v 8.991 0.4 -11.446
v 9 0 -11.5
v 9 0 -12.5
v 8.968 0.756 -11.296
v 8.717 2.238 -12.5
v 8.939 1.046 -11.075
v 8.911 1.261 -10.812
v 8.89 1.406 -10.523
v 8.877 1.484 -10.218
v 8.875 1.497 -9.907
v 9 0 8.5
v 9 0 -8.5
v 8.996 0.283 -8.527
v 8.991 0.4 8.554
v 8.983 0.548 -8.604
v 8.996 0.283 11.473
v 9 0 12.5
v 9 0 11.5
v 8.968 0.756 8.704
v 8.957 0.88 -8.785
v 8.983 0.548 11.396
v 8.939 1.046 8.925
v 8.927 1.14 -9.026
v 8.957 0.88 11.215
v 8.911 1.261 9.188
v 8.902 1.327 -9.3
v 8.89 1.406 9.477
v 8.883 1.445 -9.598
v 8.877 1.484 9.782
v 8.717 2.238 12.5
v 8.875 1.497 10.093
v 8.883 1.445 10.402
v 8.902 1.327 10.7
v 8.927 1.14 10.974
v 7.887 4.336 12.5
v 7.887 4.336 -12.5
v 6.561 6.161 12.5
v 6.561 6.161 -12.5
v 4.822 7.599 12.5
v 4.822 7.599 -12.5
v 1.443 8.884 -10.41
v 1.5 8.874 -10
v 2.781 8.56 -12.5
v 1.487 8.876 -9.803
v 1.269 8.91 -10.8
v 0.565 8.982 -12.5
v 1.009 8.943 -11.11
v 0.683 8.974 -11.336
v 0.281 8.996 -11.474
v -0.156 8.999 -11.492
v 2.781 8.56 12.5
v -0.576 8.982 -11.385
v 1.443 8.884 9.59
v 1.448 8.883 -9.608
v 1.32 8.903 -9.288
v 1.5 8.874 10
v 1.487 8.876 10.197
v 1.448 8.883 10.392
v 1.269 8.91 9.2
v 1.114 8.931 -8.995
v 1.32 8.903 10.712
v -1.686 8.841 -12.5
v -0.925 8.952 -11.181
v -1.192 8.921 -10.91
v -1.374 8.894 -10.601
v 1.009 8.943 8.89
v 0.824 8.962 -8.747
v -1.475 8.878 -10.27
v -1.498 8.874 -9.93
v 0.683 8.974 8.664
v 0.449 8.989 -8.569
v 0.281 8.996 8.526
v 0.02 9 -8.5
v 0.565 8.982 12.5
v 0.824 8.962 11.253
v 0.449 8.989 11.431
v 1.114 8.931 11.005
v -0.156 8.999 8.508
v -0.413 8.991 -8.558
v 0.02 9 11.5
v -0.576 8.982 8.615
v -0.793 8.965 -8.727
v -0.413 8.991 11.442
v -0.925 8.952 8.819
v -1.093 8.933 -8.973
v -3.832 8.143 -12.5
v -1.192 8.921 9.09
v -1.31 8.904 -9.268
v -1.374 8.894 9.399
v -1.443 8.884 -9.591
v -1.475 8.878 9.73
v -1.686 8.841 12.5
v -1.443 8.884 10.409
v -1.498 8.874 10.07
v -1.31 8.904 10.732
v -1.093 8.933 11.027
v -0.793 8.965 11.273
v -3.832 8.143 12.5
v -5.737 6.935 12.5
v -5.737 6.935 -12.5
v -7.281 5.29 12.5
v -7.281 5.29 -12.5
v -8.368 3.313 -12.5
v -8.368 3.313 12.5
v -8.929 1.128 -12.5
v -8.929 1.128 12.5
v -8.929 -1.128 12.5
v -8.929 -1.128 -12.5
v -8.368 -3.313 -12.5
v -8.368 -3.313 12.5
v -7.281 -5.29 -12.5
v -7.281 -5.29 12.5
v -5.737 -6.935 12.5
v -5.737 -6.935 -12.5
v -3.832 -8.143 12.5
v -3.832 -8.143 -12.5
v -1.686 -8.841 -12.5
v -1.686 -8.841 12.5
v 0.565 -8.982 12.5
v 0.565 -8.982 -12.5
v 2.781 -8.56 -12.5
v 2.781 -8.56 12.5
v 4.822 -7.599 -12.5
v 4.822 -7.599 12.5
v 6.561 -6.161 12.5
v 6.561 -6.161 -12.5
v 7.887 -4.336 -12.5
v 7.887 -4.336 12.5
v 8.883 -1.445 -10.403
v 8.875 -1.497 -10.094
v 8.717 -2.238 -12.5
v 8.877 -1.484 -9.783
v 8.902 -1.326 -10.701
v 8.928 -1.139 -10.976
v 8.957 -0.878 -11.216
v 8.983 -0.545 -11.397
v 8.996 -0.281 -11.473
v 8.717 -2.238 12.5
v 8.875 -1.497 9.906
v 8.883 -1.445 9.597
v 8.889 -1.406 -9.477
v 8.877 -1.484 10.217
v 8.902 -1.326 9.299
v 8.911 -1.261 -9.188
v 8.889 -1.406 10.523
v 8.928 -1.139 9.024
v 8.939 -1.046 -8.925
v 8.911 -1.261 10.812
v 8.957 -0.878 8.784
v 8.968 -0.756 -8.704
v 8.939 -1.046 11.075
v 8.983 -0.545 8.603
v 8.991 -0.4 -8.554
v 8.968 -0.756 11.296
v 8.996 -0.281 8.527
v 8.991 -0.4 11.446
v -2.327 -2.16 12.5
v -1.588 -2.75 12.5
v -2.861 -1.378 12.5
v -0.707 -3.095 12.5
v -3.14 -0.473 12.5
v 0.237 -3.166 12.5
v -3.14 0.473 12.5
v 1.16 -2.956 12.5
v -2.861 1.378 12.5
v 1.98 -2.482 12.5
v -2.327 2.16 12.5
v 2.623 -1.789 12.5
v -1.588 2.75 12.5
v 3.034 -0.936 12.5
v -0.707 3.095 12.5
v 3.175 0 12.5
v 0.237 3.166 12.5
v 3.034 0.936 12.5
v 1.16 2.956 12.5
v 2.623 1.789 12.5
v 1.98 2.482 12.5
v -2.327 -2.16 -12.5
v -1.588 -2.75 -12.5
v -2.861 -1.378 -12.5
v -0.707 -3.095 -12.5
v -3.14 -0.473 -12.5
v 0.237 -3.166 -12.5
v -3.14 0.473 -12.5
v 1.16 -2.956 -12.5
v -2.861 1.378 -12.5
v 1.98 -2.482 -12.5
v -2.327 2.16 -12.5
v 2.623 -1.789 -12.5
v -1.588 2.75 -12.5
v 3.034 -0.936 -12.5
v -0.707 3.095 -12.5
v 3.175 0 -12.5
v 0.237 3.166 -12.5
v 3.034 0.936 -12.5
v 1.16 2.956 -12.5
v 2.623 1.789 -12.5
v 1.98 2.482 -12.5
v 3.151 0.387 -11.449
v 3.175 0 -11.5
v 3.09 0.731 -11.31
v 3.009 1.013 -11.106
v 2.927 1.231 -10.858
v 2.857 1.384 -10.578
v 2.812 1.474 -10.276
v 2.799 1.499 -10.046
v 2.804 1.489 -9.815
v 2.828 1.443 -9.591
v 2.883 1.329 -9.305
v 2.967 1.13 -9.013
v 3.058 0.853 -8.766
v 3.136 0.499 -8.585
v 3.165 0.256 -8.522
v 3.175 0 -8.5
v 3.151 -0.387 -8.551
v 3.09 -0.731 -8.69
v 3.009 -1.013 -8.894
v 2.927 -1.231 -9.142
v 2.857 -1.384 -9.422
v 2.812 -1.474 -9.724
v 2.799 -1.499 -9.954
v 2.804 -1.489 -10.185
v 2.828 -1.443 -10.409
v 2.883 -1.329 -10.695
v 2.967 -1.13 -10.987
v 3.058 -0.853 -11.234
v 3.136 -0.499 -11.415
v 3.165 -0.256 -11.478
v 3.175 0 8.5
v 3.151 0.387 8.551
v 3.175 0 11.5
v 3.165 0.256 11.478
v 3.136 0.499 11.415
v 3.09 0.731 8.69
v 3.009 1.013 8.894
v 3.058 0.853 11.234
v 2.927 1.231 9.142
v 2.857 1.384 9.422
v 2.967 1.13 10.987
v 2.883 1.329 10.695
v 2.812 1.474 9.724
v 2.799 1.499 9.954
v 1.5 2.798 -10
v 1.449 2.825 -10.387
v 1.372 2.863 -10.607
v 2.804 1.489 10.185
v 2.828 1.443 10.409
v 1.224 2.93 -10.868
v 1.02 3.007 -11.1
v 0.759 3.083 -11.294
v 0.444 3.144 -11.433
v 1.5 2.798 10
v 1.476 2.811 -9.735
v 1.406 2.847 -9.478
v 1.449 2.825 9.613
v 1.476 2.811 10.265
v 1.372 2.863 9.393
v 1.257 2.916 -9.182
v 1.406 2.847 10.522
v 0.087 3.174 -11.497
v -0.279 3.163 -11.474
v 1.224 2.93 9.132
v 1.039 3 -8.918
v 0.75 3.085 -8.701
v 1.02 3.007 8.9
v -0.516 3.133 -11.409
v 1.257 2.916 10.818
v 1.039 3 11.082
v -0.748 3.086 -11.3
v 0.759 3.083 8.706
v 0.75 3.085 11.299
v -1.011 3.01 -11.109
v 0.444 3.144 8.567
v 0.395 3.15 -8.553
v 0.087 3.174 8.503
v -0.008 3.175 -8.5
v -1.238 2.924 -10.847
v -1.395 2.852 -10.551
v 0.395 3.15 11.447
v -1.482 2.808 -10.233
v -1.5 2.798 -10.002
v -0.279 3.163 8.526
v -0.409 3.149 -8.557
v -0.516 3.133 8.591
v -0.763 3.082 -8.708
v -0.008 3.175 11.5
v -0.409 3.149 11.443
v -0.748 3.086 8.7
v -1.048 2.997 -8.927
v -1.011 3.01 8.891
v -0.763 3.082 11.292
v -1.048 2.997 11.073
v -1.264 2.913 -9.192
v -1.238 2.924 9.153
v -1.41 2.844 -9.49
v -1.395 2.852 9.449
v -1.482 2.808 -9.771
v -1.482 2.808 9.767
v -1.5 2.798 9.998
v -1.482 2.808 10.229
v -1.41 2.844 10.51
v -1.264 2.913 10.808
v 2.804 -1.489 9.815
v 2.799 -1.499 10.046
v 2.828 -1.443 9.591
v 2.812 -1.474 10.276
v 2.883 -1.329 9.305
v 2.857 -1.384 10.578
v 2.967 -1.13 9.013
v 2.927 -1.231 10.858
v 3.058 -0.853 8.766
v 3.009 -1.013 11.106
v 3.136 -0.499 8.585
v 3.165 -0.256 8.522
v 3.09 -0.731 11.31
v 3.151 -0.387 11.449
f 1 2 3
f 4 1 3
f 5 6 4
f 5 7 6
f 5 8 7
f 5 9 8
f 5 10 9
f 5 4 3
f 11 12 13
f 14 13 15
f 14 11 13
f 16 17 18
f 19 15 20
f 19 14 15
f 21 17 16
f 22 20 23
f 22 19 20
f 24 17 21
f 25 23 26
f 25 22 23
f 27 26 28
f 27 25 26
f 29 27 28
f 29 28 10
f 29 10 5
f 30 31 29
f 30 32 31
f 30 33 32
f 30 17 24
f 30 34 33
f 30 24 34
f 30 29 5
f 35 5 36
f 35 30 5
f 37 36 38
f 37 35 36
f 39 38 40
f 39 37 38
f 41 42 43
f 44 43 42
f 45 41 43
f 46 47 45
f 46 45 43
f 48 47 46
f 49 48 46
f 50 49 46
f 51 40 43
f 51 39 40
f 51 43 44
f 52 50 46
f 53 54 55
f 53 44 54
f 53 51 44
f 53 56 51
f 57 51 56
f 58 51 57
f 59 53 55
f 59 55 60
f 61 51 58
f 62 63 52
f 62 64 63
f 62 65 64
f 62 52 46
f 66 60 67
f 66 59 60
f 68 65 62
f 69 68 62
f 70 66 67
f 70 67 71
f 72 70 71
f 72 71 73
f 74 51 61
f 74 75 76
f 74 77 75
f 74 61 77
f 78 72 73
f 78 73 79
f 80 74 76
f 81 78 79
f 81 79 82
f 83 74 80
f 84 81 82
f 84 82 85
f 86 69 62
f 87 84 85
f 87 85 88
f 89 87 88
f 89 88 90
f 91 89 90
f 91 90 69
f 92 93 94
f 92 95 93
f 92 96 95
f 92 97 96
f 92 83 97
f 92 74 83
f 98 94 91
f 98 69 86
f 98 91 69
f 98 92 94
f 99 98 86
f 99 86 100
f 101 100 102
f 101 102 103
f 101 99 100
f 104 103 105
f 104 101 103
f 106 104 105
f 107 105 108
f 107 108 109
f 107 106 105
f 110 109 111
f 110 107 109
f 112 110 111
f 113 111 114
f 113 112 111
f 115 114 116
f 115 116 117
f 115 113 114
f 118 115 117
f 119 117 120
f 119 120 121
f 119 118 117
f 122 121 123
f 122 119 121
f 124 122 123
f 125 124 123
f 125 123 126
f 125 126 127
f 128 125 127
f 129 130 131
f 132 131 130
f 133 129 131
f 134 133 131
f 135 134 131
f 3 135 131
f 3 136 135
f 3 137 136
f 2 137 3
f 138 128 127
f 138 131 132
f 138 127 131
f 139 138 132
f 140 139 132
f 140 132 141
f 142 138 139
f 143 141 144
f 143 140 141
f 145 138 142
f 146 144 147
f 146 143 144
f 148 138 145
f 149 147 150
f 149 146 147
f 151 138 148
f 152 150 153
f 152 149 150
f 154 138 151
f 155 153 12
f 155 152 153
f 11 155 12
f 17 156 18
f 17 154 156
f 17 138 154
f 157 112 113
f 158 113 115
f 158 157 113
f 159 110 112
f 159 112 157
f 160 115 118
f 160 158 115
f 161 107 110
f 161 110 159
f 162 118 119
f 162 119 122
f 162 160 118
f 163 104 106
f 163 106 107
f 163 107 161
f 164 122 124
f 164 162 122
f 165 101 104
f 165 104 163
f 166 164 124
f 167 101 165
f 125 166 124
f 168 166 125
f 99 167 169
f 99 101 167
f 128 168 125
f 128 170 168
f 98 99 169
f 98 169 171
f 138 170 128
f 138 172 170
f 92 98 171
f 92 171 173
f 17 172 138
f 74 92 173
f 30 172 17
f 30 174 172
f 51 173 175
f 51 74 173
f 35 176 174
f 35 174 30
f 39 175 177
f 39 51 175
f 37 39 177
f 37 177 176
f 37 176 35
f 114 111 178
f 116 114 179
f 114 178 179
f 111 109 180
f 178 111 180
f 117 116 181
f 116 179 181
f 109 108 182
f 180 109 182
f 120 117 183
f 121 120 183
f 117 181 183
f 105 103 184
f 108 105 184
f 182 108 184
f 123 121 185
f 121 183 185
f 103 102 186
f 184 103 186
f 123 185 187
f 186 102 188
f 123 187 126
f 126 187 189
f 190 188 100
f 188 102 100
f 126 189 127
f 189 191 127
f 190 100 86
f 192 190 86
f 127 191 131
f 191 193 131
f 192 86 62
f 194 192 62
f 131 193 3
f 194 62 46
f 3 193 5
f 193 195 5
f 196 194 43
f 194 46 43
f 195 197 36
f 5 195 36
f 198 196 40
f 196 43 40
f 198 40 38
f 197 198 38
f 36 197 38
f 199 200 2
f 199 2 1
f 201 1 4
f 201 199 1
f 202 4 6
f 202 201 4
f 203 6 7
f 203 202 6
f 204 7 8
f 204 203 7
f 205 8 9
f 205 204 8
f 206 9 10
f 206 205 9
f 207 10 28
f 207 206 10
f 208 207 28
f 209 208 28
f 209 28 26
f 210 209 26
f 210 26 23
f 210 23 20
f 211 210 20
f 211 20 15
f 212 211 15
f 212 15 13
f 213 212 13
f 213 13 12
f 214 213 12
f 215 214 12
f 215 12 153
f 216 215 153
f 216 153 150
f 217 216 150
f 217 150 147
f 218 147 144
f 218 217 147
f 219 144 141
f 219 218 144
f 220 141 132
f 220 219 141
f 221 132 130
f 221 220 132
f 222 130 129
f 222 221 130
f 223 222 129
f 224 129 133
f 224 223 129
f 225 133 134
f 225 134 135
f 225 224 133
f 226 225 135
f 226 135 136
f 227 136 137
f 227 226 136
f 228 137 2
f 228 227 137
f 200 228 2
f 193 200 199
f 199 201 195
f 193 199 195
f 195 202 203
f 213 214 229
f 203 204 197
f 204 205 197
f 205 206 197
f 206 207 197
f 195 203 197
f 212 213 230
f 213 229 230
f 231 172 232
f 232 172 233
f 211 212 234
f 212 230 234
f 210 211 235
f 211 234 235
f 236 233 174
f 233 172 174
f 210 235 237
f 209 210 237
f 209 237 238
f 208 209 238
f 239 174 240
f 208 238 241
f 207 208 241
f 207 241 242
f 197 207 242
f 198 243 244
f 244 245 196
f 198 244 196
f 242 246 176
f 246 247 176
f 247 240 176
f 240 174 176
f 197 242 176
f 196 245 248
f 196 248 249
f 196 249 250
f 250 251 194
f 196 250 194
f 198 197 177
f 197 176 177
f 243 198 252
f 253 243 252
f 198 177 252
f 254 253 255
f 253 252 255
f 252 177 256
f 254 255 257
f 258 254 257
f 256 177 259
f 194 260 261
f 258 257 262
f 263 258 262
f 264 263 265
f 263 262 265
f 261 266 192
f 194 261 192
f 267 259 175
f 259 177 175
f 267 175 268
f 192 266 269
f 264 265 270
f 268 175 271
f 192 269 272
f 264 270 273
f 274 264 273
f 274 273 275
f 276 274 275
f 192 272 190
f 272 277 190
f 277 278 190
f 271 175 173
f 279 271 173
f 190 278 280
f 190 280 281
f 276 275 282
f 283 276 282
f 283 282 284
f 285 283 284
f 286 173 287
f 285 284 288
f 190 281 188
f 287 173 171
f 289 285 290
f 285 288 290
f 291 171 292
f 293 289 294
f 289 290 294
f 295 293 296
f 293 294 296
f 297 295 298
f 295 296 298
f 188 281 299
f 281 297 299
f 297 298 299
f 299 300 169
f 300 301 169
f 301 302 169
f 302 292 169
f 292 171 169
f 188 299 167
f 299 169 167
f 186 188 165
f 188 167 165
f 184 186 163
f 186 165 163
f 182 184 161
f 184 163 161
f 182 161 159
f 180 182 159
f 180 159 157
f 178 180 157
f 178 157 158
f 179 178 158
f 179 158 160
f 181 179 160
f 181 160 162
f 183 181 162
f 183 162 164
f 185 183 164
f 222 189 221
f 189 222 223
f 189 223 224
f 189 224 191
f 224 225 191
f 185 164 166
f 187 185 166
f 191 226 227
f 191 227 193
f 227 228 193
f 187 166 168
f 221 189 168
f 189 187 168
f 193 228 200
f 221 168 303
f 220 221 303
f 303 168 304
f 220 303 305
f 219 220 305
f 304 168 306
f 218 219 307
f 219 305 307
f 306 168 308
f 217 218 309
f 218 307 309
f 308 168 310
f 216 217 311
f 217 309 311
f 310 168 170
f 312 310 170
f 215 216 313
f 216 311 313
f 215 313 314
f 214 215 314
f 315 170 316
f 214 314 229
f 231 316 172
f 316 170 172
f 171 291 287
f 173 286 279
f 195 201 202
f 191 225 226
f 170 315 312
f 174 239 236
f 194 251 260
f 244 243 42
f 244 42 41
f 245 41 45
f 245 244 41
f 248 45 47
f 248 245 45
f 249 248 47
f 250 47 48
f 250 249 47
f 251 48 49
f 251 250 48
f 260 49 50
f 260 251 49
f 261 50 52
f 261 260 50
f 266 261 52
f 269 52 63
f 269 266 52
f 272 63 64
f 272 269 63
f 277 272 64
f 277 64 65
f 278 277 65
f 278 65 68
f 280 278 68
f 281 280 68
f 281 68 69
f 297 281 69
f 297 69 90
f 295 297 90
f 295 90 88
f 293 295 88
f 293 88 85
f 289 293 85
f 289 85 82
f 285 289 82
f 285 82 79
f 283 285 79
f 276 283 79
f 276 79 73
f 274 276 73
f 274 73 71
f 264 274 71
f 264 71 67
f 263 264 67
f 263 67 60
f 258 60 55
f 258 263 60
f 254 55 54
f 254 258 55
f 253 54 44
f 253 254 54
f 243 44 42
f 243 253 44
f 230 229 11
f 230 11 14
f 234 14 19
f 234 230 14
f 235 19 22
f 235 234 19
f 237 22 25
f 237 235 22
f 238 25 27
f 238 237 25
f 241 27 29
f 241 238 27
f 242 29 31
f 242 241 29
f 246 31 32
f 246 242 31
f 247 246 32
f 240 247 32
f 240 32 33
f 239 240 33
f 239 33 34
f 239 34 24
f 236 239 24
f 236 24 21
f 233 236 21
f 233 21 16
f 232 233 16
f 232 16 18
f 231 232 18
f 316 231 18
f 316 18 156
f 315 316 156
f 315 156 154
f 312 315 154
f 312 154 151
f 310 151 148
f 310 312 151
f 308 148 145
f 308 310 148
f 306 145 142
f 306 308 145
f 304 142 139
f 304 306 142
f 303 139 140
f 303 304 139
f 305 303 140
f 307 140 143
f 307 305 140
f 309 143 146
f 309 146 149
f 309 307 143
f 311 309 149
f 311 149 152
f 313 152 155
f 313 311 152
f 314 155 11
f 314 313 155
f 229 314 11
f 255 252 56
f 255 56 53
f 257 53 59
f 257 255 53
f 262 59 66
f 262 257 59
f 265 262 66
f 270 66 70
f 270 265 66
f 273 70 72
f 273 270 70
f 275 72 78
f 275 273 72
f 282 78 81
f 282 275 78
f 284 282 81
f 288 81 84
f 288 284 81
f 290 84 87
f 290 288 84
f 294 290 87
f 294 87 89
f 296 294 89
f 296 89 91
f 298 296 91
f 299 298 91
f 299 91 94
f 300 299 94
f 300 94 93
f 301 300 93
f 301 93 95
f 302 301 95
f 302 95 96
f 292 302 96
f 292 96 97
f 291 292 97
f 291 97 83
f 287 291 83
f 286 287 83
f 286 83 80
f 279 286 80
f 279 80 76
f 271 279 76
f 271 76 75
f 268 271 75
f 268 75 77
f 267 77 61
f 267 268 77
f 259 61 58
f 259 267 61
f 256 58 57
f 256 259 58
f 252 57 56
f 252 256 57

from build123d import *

# Parameters (mm, degrees)
SKETCH1_R           = 9
BOSS_EXTRUDE1_DEPTH = 12.5
SKETCH2_R           = 3.175
CUT_EXTRUDE1_DEPTH  = 26
SKETCH3_R           = 1.5
CUT_EXTRUDE2_DEPTH  = 10
SKETCH4_R           = 1.5
CUT_EXTRUDE3_DEPTH  = 10.0000001


with BuildPart() as part:
    # Sketch1 → Boss-Extrude1 (new body, symmetric)
    with BuildSketch(Plane.XY):
        Circle(SKETCH1_R)
    extrude(amount=BOSS_EXTRUDE1_DEPTH, both=True)

    # Sketch2 → Cut-Extrude1 (cut, through all)
    with BuildSketch(Plane.XY.offset(12.5)):
        Circle(SKETCH2_R)
    extrude(amount=-CUT_EXTRUDE1_DEPTH, mode=Mode.SUBTRACT)

    # Sketch3 → Cut-Extrude2 (cut, through all)
    with BuildSketch(Plane(origin=(0, 0, 0), x_dir=(1, 0, 0), z_dir=(0, 1, 0))):
        with Locations((0, 10)):
            Circle(SKETCH3_R)
        with Locations((0, -10)):
            Circle(SKETCH3_R)
    extrude(amount=CUT_EXTRUDE2_DEPTH, mode=Mode.SUBTRACT)

    # Sketch4 → Cut-Extrude3 (cut, through all)
    with BuildSketch(Plane(origin=(0, 0, 0), x_dir=(0, 0, -1), z_dir=(1, 0, 0))):
        with Locations((-10, 0)):
            Circle(SKETCH4_R)
        with Locations((10, 0)):
            Circle(SKETCH4_R)
    extrude(amount=CUT_EXTRUDE3_DEPTH, mode=Mode.SUBTRACT)


solid = part.part
